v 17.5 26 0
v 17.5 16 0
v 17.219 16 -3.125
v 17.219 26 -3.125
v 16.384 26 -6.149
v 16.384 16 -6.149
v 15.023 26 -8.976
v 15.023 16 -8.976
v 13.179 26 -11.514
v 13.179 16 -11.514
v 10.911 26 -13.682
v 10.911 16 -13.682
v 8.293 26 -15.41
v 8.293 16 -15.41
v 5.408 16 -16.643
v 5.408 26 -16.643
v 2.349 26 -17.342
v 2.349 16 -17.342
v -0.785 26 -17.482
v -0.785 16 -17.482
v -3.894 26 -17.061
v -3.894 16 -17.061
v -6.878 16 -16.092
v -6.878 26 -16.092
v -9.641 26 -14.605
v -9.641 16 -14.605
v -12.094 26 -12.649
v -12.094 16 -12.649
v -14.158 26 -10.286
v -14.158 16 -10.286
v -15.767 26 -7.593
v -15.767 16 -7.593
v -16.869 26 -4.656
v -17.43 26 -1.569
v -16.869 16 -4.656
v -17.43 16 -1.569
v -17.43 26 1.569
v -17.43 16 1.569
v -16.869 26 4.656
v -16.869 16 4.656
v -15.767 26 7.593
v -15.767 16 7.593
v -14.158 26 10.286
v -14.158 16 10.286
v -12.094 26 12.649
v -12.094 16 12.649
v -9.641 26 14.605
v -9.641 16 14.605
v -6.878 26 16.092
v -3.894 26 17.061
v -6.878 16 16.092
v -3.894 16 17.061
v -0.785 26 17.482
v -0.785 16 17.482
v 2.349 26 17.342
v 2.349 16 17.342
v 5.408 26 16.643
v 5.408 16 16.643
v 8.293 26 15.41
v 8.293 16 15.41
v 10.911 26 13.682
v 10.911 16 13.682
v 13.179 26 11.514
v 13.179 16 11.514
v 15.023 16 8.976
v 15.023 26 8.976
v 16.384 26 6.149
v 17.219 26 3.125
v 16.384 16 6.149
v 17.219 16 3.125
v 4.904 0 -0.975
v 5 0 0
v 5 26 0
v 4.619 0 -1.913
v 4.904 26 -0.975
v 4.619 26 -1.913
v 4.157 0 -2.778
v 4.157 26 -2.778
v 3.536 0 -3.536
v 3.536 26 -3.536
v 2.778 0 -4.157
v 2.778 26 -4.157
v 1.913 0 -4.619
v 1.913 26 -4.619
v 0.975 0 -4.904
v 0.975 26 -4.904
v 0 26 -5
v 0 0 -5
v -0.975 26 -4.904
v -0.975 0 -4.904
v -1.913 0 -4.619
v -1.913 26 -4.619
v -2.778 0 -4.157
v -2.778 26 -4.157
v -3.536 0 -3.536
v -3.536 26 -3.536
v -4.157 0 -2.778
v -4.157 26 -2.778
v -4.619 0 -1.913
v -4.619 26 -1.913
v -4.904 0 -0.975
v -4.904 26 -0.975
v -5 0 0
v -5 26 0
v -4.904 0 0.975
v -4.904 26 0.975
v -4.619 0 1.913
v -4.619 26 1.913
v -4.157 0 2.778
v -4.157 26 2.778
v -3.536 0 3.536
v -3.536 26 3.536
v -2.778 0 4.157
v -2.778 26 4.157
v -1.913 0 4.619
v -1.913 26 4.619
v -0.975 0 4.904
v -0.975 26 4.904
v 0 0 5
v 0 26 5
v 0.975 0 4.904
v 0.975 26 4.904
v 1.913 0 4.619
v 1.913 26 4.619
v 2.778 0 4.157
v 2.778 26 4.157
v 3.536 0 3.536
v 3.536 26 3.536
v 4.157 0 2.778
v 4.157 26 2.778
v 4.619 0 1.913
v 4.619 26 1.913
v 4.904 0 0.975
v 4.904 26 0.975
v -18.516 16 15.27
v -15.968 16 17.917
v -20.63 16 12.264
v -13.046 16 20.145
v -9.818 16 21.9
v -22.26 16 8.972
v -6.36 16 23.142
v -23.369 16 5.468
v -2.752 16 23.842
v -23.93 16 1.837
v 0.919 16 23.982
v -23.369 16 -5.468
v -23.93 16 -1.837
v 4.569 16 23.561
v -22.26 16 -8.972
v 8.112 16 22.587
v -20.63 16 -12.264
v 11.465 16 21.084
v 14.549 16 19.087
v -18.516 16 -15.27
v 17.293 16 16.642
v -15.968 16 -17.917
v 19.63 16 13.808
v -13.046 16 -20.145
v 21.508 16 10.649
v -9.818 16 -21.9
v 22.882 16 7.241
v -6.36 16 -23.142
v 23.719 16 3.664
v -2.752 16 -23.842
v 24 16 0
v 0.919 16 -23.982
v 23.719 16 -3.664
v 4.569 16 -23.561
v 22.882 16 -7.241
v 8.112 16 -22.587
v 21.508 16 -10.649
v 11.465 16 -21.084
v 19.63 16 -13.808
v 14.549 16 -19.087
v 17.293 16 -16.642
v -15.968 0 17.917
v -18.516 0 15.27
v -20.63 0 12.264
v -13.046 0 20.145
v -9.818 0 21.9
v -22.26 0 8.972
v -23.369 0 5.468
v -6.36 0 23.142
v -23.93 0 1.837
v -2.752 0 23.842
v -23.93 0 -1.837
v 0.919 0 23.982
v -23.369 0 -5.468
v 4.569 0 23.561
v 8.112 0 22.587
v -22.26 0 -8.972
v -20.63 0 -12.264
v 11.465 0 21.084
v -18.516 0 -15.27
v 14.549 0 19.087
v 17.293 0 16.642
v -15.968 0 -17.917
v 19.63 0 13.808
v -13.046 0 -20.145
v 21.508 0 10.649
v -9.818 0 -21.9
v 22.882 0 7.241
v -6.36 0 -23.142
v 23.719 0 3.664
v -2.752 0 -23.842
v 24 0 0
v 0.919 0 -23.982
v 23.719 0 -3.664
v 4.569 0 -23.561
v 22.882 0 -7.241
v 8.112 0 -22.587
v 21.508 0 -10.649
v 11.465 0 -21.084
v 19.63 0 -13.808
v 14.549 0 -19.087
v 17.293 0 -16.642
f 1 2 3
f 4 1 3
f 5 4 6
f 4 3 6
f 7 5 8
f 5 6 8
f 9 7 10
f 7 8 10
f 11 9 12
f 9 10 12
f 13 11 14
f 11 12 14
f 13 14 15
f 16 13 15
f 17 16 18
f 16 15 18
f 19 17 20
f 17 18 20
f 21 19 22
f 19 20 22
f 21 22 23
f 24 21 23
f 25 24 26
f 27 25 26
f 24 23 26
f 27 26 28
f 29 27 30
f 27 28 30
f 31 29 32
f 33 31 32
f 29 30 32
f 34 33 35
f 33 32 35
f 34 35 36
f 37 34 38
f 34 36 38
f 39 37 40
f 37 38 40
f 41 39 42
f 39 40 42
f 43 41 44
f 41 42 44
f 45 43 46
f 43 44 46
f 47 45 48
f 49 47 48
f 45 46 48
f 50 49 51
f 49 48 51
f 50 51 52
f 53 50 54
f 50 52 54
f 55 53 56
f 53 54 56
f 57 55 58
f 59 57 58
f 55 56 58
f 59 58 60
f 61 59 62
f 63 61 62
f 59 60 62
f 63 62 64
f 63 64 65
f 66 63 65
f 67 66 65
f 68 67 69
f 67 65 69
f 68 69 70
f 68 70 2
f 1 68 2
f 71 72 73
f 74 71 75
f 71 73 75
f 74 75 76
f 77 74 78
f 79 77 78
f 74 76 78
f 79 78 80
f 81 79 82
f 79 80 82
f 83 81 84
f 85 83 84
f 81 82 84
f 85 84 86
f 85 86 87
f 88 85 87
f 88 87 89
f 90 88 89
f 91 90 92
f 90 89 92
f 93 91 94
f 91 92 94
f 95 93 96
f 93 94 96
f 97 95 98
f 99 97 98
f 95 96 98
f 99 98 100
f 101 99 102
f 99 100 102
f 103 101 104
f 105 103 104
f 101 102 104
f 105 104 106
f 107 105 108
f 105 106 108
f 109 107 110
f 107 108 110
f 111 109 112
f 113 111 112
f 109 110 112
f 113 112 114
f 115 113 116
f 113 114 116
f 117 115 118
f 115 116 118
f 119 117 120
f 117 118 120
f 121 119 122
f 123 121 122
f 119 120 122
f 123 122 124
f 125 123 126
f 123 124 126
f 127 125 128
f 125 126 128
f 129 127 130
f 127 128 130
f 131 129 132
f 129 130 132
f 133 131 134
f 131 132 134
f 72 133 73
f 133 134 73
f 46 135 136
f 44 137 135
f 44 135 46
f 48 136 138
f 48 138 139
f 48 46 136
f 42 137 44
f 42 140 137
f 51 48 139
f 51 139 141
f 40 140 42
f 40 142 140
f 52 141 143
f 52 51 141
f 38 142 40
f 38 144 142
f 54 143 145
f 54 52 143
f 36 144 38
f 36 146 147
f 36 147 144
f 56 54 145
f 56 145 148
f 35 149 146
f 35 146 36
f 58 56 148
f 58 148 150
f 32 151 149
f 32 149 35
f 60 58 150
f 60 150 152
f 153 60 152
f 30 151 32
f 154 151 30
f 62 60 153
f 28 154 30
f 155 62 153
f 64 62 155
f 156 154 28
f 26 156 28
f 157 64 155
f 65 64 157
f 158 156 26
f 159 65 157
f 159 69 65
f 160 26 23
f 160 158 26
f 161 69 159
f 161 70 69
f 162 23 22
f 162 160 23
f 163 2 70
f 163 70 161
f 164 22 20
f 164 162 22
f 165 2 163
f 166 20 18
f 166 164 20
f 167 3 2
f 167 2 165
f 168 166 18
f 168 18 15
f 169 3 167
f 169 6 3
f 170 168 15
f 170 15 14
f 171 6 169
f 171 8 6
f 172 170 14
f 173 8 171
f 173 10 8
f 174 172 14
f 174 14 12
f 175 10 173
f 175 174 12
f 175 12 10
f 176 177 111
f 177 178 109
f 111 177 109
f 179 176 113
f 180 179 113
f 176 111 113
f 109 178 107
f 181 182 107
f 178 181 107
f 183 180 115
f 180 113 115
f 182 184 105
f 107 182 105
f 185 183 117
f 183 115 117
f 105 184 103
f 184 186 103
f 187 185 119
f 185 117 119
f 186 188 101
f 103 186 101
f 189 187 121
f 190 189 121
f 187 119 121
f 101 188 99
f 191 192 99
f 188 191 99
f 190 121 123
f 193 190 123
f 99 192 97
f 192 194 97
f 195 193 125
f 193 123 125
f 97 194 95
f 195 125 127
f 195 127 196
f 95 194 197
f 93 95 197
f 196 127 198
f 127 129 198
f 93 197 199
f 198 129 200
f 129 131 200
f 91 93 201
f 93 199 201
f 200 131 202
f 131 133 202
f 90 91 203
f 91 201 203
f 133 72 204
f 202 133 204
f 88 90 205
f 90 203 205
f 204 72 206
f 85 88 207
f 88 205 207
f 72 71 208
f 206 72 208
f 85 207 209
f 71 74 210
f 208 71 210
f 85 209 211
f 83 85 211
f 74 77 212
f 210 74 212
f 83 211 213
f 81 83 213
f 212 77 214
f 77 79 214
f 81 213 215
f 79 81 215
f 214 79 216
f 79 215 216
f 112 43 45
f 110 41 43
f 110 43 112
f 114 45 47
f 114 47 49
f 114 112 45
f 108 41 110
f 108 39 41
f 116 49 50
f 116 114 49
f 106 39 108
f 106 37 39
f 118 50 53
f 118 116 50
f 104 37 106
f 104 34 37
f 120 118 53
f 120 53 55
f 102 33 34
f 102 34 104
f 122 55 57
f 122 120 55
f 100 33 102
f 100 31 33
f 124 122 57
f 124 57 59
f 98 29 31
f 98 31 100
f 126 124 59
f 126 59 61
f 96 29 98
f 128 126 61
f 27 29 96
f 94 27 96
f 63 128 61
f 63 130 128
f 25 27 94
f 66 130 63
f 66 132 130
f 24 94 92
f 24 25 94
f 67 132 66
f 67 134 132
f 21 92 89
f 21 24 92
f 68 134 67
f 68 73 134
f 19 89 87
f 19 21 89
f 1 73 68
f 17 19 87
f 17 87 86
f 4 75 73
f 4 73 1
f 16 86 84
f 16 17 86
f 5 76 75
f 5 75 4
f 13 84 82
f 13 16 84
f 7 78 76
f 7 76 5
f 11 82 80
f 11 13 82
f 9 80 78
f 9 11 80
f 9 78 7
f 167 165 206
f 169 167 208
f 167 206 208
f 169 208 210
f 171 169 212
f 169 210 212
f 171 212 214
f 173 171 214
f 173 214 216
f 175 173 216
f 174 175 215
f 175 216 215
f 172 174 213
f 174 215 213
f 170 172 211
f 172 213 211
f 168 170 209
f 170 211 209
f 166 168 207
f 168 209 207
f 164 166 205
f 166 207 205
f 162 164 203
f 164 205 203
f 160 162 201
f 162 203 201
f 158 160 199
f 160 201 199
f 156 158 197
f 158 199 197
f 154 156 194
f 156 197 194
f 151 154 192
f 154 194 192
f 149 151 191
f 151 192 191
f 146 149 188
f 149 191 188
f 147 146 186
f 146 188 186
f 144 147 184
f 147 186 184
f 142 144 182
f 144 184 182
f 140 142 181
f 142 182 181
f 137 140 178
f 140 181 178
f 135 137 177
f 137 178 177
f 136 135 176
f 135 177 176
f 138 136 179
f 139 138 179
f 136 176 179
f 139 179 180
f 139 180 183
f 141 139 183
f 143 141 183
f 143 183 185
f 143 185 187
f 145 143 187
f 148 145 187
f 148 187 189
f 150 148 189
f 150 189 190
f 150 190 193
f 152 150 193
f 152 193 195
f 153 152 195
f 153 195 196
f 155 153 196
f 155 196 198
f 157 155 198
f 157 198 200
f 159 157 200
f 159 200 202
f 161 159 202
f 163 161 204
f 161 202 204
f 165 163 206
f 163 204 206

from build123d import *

# Parameters (mm, degrees)
SKETCH1_R           = 24
BOSS_EXTRUDE1_DEPTH = 16
SKETCH2_R           = 17.5
BOSS_EXTRUDE2_DEPTH = 10
SKETCH3_R           = 5
CUT_EXTRUDE1_DEPTH  = 26


with BuildPart() as part:
    # Sketch1 → Boss-Extrude1 (new body)
    with BuildSketch(Plane(origin=(0, 0, 0), x_dir=(1, 0, 0), z_dir=(0, 1, 0))):
        Circle(SKETCH1_R)
    extrude(amount=BOSS_EXTRUDE1_DEPTH)

    # Sketch2 → Boss-Extrude2 (add)
    with BuildSketch(Plane(origin=(0, 16, 0), x_dir=(1, 0, 0), z_dir=(0, 1, 0))):
        Circle(SKETCH2_R)
    extrude(amount=BOSS_EXTRUDE2_DEPTH)

    # Sketch3 → Cut-Extrude1 (cut)
    with BuildSketch(Plane(origin=(0, 26, 0), x_dir=(1, 0, 0), z_dir=(0, 1, 0))):
        Circle(SKETCH3_R)
    extrude(amount=-CUT_EXTRUDE1_DEPTH, mode=Mode.SUBTRACT)


solid = part.part
